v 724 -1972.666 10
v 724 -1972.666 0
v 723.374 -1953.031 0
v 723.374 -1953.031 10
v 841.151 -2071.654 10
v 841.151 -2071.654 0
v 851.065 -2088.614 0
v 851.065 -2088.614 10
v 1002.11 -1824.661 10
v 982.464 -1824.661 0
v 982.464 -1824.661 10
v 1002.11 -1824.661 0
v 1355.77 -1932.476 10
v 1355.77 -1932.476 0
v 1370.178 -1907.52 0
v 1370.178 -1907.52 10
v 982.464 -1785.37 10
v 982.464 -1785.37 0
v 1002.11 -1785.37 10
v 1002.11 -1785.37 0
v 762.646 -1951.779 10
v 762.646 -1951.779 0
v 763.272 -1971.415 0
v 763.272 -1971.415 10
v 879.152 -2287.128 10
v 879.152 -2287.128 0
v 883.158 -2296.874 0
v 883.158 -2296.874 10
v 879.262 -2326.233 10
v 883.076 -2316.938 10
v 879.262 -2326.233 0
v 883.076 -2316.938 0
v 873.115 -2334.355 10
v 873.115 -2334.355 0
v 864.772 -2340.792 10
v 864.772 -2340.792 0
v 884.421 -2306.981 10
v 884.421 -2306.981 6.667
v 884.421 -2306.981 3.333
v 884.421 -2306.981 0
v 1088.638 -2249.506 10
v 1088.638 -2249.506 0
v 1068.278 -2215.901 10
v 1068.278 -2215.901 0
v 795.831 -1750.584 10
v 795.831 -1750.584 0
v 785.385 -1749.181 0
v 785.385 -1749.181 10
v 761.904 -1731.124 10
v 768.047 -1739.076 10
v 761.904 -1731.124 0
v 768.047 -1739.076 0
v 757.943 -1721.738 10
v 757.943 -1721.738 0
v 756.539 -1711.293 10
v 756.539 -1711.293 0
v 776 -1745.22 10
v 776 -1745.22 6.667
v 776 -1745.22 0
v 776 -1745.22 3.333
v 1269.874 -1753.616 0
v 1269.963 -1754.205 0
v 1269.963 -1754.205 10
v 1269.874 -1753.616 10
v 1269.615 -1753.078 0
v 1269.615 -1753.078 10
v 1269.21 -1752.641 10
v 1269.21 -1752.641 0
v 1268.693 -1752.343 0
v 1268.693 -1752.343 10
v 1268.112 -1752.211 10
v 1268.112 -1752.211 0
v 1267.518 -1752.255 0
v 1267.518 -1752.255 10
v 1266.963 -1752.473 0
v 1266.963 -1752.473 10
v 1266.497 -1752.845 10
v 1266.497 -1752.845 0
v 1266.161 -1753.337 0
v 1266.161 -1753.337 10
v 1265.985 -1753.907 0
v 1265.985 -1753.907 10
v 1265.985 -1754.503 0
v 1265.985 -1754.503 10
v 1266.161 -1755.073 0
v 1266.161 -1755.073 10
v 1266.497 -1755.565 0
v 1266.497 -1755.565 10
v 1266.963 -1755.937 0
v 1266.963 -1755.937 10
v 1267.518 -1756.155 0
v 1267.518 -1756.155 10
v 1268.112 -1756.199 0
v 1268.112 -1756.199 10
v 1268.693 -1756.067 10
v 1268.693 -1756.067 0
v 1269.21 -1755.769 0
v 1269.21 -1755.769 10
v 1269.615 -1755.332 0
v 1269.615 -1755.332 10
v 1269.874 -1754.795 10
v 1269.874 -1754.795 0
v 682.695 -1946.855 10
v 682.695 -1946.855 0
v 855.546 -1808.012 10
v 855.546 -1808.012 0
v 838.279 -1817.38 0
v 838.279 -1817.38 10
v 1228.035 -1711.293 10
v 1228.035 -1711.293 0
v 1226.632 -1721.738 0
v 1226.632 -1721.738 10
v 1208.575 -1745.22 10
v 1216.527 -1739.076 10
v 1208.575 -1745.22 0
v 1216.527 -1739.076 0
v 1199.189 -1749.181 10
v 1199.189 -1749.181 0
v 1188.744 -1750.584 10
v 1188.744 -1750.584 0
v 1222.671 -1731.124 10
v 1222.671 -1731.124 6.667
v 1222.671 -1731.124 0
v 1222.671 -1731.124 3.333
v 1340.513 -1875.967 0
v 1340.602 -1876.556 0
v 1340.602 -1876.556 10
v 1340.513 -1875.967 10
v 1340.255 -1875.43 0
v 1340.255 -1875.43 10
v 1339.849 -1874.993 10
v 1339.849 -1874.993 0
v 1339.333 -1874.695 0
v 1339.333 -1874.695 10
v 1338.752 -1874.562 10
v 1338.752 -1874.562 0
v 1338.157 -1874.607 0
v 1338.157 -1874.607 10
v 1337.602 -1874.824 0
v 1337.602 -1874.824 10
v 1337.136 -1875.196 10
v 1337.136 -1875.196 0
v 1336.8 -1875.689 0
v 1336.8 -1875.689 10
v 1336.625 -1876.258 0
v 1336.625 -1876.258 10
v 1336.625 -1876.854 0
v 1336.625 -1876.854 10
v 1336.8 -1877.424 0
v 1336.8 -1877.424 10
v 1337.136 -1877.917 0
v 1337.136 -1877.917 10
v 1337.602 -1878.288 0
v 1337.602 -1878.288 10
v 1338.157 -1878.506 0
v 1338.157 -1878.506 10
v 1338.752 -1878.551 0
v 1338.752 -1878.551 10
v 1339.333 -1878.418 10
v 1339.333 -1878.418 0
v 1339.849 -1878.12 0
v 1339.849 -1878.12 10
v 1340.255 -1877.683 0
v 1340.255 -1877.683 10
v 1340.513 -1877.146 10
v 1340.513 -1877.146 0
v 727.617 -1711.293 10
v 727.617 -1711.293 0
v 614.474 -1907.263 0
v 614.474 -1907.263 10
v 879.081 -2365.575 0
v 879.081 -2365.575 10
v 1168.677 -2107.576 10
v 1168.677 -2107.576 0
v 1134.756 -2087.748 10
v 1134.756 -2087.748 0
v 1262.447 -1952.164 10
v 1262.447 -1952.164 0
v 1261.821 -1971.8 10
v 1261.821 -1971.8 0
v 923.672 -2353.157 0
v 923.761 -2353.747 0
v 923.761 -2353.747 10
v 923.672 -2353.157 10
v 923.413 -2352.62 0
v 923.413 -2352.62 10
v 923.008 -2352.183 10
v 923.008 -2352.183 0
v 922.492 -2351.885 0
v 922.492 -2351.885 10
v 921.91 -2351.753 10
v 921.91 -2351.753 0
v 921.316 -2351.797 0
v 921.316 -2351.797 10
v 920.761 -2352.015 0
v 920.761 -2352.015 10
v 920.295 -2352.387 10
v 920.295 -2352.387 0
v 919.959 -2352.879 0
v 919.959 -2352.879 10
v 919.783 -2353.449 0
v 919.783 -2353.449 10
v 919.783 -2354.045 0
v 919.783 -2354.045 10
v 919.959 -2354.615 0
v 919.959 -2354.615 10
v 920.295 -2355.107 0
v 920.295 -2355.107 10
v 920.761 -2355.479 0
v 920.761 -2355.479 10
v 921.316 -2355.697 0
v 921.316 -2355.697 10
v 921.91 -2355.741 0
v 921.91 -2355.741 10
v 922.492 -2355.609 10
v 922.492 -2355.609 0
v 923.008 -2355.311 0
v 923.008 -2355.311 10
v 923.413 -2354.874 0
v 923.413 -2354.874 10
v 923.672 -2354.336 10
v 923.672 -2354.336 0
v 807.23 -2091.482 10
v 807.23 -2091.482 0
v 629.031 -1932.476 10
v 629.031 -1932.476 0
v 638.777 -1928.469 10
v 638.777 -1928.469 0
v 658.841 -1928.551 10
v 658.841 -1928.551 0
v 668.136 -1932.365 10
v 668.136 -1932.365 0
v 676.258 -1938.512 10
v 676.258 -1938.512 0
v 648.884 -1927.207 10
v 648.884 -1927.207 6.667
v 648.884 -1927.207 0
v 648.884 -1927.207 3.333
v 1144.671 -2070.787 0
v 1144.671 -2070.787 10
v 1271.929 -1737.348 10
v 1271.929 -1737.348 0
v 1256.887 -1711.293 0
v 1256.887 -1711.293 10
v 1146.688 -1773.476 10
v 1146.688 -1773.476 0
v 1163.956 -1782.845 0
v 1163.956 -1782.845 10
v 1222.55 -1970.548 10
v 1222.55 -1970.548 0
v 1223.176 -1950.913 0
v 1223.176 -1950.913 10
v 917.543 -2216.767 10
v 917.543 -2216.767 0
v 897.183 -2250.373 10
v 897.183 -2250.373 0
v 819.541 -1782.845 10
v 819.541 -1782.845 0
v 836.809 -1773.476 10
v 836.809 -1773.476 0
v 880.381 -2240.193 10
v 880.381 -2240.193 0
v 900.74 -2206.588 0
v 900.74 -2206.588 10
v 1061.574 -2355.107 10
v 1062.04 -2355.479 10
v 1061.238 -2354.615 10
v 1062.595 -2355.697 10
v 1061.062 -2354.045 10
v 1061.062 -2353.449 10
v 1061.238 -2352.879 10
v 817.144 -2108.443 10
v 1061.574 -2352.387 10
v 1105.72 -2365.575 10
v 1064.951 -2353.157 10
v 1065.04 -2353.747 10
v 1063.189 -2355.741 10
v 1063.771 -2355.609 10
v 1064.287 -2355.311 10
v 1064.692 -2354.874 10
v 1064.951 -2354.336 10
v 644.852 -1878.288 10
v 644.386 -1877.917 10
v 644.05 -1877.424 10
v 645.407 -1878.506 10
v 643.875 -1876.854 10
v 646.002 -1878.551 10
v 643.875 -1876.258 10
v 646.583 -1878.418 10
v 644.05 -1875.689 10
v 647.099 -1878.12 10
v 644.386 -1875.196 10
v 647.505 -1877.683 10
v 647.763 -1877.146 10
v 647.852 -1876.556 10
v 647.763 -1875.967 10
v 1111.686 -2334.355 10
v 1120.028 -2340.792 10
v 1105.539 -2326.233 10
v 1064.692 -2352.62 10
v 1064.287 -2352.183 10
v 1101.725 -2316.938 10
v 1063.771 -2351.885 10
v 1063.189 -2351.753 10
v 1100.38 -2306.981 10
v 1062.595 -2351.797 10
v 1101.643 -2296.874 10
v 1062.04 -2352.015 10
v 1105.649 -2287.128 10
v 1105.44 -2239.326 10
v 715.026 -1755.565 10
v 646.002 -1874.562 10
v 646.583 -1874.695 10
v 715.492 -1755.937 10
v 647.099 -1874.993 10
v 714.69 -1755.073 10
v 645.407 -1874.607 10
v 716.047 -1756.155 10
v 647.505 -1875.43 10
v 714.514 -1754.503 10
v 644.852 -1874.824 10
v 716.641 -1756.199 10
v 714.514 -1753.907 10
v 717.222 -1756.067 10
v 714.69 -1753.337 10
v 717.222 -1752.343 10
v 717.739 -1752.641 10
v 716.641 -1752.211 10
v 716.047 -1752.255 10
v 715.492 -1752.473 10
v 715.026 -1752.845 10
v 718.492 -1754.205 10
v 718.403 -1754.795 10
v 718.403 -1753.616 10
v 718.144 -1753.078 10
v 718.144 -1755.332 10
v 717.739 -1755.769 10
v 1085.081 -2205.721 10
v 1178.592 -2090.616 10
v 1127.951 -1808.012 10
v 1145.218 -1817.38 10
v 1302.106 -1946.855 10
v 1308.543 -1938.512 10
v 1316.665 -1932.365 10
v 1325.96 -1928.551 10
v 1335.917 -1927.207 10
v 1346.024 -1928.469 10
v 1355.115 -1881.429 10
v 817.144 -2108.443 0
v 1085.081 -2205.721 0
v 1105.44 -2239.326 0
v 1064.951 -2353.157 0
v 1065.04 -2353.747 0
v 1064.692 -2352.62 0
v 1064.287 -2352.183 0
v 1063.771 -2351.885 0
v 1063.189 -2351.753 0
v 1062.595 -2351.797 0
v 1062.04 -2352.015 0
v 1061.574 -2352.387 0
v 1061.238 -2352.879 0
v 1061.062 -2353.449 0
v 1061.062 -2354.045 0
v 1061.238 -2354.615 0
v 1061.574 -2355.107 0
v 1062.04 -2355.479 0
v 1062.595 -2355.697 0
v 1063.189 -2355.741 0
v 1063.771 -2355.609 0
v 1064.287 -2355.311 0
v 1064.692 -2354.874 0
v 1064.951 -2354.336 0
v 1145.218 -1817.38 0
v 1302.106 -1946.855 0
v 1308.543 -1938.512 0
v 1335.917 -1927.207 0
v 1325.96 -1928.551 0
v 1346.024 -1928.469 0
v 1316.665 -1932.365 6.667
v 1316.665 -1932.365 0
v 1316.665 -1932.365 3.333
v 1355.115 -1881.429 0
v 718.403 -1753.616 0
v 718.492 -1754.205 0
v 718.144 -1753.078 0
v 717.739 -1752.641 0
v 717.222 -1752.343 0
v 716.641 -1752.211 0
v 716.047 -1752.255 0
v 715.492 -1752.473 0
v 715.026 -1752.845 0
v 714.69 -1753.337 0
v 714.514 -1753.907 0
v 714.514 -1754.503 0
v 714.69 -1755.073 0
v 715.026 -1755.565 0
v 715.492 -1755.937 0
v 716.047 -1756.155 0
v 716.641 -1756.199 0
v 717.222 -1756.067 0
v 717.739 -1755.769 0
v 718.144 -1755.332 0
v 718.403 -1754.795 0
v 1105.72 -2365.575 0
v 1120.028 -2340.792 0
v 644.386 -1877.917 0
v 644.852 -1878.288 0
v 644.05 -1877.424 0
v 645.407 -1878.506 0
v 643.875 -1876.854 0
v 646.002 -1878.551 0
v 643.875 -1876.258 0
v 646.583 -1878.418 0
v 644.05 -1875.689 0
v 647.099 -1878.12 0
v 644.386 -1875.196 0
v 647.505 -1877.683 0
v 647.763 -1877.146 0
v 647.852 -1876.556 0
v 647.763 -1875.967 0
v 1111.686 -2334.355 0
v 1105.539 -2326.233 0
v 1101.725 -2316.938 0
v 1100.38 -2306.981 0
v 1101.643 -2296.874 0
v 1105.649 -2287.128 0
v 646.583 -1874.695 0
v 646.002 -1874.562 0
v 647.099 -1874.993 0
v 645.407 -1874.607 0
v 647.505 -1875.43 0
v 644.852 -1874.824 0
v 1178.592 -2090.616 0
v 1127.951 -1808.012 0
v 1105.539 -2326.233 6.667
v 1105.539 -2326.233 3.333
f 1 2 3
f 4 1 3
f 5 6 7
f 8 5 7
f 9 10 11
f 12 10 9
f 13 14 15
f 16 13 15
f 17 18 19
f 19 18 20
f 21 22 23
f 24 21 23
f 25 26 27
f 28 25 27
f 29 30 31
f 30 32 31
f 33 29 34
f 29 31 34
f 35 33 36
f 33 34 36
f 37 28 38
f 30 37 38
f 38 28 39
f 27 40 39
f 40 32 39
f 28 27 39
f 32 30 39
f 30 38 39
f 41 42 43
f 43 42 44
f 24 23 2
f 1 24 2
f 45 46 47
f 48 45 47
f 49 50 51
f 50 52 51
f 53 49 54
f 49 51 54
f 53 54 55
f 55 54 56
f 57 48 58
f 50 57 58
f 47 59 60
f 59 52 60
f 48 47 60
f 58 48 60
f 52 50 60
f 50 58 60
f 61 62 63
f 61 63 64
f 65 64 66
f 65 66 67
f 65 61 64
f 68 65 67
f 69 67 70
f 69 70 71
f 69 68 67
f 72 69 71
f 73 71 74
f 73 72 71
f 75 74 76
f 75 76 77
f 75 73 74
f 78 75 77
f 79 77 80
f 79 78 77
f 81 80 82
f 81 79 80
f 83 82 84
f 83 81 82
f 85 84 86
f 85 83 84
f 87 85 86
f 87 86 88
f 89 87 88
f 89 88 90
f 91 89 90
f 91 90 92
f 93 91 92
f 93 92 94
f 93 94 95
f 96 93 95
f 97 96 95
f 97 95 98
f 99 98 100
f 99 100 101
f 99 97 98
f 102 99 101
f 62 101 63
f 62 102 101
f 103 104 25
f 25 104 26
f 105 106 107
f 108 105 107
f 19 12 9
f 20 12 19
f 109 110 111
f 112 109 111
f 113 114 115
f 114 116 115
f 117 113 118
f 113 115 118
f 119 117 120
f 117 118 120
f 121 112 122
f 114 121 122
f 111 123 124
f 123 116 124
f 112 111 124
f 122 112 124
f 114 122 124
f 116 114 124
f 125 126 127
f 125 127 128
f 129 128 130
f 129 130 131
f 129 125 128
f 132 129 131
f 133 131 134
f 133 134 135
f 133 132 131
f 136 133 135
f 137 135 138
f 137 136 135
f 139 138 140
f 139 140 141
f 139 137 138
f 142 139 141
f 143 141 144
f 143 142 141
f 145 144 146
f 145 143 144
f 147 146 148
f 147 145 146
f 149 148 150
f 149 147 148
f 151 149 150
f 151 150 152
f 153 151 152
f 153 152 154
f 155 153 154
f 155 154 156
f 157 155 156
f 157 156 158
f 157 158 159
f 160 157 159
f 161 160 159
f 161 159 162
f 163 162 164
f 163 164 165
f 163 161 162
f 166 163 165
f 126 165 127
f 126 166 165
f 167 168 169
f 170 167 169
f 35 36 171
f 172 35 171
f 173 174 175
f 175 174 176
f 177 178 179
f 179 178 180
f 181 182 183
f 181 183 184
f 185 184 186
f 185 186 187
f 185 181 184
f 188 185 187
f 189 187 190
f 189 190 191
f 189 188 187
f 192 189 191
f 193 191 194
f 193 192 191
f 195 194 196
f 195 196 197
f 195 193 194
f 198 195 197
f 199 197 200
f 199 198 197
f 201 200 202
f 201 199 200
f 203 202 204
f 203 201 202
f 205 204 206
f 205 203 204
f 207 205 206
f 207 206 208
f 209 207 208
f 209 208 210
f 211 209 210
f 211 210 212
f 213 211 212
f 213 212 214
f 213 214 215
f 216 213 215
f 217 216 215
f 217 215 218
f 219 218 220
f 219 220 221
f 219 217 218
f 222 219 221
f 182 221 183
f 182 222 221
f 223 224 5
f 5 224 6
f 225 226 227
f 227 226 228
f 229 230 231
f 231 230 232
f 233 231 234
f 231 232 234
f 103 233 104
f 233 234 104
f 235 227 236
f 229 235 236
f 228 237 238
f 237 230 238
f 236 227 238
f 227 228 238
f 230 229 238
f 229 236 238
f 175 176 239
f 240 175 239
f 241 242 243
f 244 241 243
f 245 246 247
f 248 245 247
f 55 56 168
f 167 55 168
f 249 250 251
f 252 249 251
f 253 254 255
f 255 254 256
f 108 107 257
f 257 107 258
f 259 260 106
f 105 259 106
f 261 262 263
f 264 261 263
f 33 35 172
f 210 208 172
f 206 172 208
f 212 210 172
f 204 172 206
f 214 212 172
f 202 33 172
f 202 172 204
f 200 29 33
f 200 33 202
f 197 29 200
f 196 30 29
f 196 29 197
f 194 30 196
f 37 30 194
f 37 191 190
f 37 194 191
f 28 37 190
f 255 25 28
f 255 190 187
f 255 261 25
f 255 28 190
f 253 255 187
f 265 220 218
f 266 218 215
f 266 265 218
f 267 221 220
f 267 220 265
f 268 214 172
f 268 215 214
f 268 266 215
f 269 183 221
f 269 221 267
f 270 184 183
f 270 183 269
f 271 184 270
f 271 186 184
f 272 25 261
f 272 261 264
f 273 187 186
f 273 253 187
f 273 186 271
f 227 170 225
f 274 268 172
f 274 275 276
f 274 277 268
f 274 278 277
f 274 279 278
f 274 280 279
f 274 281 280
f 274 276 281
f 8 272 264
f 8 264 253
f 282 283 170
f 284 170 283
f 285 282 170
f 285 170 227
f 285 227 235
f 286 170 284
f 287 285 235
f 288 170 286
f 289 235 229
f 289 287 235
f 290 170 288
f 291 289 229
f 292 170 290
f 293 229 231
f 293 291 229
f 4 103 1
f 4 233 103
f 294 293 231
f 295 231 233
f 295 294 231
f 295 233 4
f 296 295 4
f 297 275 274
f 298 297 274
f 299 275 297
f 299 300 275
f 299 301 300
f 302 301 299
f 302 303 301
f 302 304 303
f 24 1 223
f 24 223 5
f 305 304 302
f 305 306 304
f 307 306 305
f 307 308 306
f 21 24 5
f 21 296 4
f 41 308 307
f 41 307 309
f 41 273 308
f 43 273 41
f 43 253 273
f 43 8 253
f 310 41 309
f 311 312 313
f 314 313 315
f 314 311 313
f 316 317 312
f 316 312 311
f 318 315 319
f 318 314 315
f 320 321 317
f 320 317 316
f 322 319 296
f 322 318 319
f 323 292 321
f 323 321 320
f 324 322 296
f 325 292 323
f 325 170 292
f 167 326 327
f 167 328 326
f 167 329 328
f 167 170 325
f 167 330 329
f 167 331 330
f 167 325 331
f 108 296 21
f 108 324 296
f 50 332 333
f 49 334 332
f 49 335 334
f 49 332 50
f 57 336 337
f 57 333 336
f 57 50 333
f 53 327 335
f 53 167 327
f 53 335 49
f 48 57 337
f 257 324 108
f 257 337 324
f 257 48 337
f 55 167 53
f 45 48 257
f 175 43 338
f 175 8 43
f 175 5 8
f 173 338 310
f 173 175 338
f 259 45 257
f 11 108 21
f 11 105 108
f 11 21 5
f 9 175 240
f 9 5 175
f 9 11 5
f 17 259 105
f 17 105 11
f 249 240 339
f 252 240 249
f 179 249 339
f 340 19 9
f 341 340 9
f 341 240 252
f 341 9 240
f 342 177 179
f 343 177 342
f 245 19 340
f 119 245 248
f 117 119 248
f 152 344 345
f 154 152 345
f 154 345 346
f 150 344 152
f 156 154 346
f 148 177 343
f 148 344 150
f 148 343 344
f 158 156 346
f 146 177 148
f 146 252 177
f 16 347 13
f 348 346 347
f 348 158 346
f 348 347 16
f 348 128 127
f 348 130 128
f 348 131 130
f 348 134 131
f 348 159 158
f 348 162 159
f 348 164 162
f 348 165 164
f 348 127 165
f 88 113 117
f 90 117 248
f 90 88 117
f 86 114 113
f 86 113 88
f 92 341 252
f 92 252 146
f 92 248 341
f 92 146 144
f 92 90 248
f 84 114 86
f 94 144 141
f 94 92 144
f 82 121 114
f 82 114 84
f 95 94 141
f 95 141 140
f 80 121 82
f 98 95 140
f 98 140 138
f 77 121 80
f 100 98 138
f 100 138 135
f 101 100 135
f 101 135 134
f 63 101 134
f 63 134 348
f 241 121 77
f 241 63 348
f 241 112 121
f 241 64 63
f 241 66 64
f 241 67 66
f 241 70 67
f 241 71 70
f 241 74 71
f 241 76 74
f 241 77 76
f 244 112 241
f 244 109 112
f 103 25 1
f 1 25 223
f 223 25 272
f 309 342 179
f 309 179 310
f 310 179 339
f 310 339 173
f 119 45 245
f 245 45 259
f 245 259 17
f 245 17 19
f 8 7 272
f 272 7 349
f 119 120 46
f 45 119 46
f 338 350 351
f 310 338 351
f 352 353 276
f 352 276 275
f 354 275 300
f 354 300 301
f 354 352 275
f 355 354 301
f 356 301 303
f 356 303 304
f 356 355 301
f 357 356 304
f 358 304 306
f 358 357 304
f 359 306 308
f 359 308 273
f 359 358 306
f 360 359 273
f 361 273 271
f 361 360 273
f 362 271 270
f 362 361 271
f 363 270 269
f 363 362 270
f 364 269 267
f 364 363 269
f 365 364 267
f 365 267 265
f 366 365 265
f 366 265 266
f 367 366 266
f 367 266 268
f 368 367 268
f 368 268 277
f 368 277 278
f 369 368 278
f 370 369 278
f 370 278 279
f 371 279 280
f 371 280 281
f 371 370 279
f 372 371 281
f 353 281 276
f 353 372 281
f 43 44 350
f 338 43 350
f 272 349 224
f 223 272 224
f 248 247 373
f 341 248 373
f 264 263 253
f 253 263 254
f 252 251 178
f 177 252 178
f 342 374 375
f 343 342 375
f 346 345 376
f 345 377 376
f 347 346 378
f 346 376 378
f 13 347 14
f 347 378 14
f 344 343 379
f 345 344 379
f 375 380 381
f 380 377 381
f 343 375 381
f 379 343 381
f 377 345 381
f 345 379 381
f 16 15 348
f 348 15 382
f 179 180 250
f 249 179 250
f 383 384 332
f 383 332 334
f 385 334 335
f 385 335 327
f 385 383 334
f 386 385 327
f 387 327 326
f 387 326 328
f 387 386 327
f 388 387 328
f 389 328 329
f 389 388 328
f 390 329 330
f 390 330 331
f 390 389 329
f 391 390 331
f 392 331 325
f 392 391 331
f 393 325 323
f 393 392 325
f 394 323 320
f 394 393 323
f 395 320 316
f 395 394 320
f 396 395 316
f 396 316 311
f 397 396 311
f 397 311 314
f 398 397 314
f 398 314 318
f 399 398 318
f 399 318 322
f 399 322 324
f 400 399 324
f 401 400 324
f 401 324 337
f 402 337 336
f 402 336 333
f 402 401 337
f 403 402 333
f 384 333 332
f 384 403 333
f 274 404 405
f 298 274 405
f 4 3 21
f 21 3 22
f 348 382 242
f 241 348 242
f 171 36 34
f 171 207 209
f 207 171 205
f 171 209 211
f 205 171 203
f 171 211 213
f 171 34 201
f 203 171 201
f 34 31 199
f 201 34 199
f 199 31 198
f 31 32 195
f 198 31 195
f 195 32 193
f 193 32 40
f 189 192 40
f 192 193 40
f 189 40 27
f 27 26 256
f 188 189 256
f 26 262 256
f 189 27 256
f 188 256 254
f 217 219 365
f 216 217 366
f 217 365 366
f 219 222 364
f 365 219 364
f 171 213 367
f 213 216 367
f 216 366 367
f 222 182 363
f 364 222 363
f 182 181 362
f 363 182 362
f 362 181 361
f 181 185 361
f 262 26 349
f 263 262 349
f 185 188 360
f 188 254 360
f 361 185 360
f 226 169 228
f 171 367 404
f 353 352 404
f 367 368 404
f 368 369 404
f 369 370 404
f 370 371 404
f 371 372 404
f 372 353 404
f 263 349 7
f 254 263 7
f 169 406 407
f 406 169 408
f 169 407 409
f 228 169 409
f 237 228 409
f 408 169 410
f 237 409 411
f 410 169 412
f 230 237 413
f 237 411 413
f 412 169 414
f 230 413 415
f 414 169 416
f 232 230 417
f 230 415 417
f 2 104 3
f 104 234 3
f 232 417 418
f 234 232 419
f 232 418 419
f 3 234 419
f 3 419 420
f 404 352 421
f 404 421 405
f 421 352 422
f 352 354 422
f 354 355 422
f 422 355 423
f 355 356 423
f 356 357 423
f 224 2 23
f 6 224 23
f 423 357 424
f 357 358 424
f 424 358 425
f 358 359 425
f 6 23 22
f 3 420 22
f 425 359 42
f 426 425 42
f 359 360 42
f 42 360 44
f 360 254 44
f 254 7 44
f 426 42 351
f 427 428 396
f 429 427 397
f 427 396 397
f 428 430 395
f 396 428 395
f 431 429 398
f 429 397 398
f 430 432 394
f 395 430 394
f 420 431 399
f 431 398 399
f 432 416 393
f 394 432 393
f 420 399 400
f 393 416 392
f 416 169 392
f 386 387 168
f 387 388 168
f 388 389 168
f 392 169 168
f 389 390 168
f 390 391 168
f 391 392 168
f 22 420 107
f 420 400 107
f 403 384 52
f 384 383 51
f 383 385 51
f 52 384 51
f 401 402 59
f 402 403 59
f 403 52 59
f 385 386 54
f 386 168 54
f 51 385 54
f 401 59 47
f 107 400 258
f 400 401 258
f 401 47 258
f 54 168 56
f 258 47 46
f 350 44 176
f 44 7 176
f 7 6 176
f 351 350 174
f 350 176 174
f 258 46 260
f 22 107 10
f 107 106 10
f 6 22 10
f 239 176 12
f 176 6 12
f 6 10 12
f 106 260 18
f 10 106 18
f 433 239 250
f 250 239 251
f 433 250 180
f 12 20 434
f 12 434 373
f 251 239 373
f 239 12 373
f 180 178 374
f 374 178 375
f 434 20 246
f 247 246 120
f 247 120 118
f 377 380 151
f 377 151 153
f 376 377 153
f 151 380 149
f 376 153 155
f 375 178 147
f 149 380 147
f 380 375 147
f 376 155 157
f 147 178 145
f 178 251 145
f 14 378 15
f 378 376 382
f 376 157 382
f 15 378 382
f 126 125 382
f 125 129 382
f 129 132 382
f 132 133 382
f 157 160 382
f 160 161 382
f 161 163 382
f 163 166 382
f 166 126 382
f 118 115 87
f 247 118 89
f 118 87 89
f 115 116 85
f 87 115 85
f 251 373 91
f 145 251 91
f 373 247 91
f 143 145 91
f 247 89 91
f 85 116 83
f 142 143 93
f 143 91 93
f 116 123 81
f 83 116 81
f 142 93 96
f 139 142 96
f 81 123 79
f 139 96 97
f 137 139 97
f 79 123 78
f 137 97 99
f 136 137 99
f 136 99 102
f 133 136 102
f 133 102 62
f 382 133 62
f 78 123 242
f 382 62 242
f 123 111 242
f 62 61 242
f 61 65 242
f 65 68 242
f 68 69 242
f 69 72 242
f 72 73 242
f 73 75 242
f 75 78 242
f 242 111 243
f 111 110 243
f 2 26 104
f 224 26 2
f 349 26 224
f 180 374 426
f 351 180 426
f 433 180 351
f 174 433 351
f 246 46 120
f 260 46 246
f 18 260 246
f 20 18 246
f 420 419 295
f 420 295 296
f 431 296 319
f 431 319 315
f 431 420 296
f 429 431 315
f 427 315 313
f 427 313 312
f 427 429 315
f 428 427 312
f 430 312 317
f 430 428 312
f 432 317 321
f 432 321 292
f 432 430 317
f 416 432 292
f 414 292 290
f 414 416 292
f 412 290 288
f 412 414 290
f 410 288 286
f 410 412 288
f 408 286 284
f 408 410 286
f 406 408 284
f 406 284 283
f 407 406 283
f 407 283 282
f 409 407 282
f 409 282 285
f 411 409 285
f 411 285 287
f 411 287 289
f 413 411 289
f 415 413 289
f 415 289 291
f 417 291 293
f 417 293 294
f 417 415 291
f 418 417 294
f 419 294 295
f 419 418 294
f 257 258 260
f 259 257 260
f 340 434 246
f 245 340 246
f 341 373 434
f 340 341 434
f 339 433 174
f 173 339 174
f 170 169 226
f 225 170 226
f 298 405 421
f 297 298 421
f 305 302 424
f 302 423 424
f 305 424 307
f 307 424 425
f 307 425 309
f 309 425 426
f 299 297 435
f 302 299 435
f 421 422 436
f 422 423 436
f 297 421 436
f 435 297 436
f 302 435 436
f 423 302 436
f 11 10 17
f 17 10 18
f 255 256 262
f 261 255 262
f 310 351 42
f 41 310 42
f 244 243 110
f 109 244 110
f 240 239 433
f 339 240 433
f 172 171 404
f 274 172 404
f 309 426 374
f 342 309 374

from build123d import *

# Parameters (mm, degrees)
MODEL_R            = 2
MODEL_W            = 19.645816046
MODEL_H            = 39.291293686
BOSS_EXTRU_1_DEPTH = 10


with BuildPart() as part:
    # Model → Boss.-Extru.1 (new body)
    with BuildSketch(Plane.XY):
        with BuildLine():
            Line((682.695045286, -1946.855082062), (879.151513744, -2287.127966132))
            add(Edge.make_bspline(
                [(879.151513744, -2287.127966132), (889.999791642, -2305.917615253), (883.561957827, -2329.943588049), (864.772308706, -2340.79203515)],
                knots=[1, 1, 1, 1, 2, 2, 2, 2], degree=3))
            Line((864.772308706, -2340.79203515), (879.080786919, -2365.574852737))
            Line((879.080786919, -2365.574852737), (909.407369941, -2365.574852737))
            Line((909.407369941, -2365.574852737), (1075.393432839, -2365.574852737))
            Line((1075.393432839, -2365.574852737), (1105.720015861, -2365.574852737))
            Line((1105.720015861, -2365.574852737), (1120.02849407, -2340.792035147))
            add(Edge.make_bspline(
                [(1120.02849407, -2340.792035147), (1101.238844947, -2329.94358805), (1094.801011127, -2305.917615255), (1105.649289021, -2287.127966132)],
                knots=[7, 7, 7, 7, 8, 8, 8, 8], degree=3))
            Line((1105.649289021, -2287.127966132), (1302.105757418, -1946.855082026))
            add(Edge.make_bspline(
                [(1302.105757418, -1946.855082026), (1312.954035312, -1928.065432904), (1336.980177311, -1921.627768287), (1355.769826434, -1932.475876978)],
                knots=[9, 9, 9, 9, 10, 10, 10, 10], degree=3))
            Line((1355.769826434, -1932.475876978), (1370.178134382, -1907.519964771))
            Line((1370.178134382, -1907.519964771), (1355.114672609, -1881.429377608))
            Line((1355.114672609, -1881.429377608), (1271.929088191, -1737.347990137))
            Line((1271.929088191, -1737.347990137), (1256.886607583, -1711.292935573))
            Line((1256.886607583, -1711.292935573), (1228.035135874, -1711.292935573))
            add(Edge.make_bspline(
                [(1228.035135874, -1711.292935573), (1228.035135876, -1732.992875424), (1210.443782043, -1750.58422926), (1188.743842192, -1750.584229262)],
                knots=[17, 17, 17, 17, 18, 18, 18, 18], degree=3))
            Line((1188.743842192, -1750.584229262), (795.830566931, -1750.584229262))
            add(Edge.make_bspline(
                [(795.830566931, -1750.584229262), (774.13062708, -1750.584229264), (756.539273244, -1732.992875431), (756.539273242, -1711.29293558)],
                knots=[19, 19, 19, 19, 20, 20, 20, 20], degree=3))
            Line((756.539273242, -1711.29293558), (727.617413106, -1711.29293558))
            Line((727.617413106, -1711.29293558), (614.474446531, -1907.262945538))
            Line((614.474446531, -1907.262945538), (629.030976268, -1932.475877023))
            add(Edge.make_bspline(
                [(629.030976268, -1932.475877023), (647.820625389, -1921.627599125), (671.846767389, -1928.065432941), (682.695045286, -1946.855082062)],
                knots=[23, 23, 23, 23, 24, 24, 24, 24], degree=3))
        make_face()
        with Locations((716.491657861, -1754.205060963)):
            Circle(MODEL_R, mode=Mode.SUBTRACT)
        with Locations((645.852191539, -1876.556374988)):
            Circle(MODEL_R, mode=Mode.SUBTRACT)
        with Locations((921.760877273, -2353.746974362)):
            Circle(MODEL_R, mode=Mode.SUBTRACT)
        with Locations((1063.039925504, -2353.746974349)):
            Circle(MODEL_R, mode=Mode.SUBTRACT)
        with Locations((1338.602199082, -1876.556405894)):
            Circle(MODEL_R, mode=Mode.SUBTRACT)
        with Locations((1267.962617169, -1754.205060913)):
            Circle(MODEL_R, mode=Mode.SUBTRACT)
        Polygon((1223.175627189, -1950.912568739), (1262.446954927, -1952.164332155), (1261.821242422, -1971.799996024), (1222.549576279, -1970.548232608), align=None, mode=Mode.SUBTRACT)
        Polygon((1168.677387646, -2107.576225944), (1134.756257166, -2087.748009122), (1144.67053478, -2070.787443882), (1178.59166526, -2090.615660704), align=None, mode=Mode.SUBTRACT)
        Polygon((1146.688110722, -1773.475865452), (1163.955948518, -1782.84480196), (1145.218413907, -1817.380308349), (1127.950576111, -1808.011541044), align=None, mode=Mode.SUBTRACT)
        Polygon((1085.080978488, -2205.721381517), (1105.440492577, -2239.326440884), (1088.637962894, -2249.506197929), (1068.278448805, -2215.901138562), align=None, mode=Mode.SUBTRACT)
        with Locations((992.287035365, -1805.015464432)):
            Rectangle(MODEL_W, MODEL_H, mode=Mode.SUBTRACT)
        Polygon((900.740118048, -2206.587700635), (917.542647733, -2216.767457676), (897.18313365, -2250.372517047), (880.380603964, -2240.192760005), align=None, mode=Mode.SUBTRACT)
        Polygon((836.808814024, -1773.475865479), (855.54634864, -1808.011541068), (838.278510846, -1817.380308376), (819.540976229, -1782.844801991), align=None, mode=Mode.SUBTRACT)
        Polygon((841.150900137, -2071.65376301), (851.065177754, -2088.614328248), (817.144047278, -2108.442545076), (807.229769661, -2091.481979838), align=None, mode=Mode.SUBTRACT)
        Polygon((762.645807706, -1951.778887881), (763.271520215, -1971.41455175), (724.000192478, -1972.666315173), (723.374479969, -1953.030651304), align=None, mode=Mode.SUBTRACT)
    extrude(amount=BOSS_EXTRU_1_DEPTH)


solid = part.part
